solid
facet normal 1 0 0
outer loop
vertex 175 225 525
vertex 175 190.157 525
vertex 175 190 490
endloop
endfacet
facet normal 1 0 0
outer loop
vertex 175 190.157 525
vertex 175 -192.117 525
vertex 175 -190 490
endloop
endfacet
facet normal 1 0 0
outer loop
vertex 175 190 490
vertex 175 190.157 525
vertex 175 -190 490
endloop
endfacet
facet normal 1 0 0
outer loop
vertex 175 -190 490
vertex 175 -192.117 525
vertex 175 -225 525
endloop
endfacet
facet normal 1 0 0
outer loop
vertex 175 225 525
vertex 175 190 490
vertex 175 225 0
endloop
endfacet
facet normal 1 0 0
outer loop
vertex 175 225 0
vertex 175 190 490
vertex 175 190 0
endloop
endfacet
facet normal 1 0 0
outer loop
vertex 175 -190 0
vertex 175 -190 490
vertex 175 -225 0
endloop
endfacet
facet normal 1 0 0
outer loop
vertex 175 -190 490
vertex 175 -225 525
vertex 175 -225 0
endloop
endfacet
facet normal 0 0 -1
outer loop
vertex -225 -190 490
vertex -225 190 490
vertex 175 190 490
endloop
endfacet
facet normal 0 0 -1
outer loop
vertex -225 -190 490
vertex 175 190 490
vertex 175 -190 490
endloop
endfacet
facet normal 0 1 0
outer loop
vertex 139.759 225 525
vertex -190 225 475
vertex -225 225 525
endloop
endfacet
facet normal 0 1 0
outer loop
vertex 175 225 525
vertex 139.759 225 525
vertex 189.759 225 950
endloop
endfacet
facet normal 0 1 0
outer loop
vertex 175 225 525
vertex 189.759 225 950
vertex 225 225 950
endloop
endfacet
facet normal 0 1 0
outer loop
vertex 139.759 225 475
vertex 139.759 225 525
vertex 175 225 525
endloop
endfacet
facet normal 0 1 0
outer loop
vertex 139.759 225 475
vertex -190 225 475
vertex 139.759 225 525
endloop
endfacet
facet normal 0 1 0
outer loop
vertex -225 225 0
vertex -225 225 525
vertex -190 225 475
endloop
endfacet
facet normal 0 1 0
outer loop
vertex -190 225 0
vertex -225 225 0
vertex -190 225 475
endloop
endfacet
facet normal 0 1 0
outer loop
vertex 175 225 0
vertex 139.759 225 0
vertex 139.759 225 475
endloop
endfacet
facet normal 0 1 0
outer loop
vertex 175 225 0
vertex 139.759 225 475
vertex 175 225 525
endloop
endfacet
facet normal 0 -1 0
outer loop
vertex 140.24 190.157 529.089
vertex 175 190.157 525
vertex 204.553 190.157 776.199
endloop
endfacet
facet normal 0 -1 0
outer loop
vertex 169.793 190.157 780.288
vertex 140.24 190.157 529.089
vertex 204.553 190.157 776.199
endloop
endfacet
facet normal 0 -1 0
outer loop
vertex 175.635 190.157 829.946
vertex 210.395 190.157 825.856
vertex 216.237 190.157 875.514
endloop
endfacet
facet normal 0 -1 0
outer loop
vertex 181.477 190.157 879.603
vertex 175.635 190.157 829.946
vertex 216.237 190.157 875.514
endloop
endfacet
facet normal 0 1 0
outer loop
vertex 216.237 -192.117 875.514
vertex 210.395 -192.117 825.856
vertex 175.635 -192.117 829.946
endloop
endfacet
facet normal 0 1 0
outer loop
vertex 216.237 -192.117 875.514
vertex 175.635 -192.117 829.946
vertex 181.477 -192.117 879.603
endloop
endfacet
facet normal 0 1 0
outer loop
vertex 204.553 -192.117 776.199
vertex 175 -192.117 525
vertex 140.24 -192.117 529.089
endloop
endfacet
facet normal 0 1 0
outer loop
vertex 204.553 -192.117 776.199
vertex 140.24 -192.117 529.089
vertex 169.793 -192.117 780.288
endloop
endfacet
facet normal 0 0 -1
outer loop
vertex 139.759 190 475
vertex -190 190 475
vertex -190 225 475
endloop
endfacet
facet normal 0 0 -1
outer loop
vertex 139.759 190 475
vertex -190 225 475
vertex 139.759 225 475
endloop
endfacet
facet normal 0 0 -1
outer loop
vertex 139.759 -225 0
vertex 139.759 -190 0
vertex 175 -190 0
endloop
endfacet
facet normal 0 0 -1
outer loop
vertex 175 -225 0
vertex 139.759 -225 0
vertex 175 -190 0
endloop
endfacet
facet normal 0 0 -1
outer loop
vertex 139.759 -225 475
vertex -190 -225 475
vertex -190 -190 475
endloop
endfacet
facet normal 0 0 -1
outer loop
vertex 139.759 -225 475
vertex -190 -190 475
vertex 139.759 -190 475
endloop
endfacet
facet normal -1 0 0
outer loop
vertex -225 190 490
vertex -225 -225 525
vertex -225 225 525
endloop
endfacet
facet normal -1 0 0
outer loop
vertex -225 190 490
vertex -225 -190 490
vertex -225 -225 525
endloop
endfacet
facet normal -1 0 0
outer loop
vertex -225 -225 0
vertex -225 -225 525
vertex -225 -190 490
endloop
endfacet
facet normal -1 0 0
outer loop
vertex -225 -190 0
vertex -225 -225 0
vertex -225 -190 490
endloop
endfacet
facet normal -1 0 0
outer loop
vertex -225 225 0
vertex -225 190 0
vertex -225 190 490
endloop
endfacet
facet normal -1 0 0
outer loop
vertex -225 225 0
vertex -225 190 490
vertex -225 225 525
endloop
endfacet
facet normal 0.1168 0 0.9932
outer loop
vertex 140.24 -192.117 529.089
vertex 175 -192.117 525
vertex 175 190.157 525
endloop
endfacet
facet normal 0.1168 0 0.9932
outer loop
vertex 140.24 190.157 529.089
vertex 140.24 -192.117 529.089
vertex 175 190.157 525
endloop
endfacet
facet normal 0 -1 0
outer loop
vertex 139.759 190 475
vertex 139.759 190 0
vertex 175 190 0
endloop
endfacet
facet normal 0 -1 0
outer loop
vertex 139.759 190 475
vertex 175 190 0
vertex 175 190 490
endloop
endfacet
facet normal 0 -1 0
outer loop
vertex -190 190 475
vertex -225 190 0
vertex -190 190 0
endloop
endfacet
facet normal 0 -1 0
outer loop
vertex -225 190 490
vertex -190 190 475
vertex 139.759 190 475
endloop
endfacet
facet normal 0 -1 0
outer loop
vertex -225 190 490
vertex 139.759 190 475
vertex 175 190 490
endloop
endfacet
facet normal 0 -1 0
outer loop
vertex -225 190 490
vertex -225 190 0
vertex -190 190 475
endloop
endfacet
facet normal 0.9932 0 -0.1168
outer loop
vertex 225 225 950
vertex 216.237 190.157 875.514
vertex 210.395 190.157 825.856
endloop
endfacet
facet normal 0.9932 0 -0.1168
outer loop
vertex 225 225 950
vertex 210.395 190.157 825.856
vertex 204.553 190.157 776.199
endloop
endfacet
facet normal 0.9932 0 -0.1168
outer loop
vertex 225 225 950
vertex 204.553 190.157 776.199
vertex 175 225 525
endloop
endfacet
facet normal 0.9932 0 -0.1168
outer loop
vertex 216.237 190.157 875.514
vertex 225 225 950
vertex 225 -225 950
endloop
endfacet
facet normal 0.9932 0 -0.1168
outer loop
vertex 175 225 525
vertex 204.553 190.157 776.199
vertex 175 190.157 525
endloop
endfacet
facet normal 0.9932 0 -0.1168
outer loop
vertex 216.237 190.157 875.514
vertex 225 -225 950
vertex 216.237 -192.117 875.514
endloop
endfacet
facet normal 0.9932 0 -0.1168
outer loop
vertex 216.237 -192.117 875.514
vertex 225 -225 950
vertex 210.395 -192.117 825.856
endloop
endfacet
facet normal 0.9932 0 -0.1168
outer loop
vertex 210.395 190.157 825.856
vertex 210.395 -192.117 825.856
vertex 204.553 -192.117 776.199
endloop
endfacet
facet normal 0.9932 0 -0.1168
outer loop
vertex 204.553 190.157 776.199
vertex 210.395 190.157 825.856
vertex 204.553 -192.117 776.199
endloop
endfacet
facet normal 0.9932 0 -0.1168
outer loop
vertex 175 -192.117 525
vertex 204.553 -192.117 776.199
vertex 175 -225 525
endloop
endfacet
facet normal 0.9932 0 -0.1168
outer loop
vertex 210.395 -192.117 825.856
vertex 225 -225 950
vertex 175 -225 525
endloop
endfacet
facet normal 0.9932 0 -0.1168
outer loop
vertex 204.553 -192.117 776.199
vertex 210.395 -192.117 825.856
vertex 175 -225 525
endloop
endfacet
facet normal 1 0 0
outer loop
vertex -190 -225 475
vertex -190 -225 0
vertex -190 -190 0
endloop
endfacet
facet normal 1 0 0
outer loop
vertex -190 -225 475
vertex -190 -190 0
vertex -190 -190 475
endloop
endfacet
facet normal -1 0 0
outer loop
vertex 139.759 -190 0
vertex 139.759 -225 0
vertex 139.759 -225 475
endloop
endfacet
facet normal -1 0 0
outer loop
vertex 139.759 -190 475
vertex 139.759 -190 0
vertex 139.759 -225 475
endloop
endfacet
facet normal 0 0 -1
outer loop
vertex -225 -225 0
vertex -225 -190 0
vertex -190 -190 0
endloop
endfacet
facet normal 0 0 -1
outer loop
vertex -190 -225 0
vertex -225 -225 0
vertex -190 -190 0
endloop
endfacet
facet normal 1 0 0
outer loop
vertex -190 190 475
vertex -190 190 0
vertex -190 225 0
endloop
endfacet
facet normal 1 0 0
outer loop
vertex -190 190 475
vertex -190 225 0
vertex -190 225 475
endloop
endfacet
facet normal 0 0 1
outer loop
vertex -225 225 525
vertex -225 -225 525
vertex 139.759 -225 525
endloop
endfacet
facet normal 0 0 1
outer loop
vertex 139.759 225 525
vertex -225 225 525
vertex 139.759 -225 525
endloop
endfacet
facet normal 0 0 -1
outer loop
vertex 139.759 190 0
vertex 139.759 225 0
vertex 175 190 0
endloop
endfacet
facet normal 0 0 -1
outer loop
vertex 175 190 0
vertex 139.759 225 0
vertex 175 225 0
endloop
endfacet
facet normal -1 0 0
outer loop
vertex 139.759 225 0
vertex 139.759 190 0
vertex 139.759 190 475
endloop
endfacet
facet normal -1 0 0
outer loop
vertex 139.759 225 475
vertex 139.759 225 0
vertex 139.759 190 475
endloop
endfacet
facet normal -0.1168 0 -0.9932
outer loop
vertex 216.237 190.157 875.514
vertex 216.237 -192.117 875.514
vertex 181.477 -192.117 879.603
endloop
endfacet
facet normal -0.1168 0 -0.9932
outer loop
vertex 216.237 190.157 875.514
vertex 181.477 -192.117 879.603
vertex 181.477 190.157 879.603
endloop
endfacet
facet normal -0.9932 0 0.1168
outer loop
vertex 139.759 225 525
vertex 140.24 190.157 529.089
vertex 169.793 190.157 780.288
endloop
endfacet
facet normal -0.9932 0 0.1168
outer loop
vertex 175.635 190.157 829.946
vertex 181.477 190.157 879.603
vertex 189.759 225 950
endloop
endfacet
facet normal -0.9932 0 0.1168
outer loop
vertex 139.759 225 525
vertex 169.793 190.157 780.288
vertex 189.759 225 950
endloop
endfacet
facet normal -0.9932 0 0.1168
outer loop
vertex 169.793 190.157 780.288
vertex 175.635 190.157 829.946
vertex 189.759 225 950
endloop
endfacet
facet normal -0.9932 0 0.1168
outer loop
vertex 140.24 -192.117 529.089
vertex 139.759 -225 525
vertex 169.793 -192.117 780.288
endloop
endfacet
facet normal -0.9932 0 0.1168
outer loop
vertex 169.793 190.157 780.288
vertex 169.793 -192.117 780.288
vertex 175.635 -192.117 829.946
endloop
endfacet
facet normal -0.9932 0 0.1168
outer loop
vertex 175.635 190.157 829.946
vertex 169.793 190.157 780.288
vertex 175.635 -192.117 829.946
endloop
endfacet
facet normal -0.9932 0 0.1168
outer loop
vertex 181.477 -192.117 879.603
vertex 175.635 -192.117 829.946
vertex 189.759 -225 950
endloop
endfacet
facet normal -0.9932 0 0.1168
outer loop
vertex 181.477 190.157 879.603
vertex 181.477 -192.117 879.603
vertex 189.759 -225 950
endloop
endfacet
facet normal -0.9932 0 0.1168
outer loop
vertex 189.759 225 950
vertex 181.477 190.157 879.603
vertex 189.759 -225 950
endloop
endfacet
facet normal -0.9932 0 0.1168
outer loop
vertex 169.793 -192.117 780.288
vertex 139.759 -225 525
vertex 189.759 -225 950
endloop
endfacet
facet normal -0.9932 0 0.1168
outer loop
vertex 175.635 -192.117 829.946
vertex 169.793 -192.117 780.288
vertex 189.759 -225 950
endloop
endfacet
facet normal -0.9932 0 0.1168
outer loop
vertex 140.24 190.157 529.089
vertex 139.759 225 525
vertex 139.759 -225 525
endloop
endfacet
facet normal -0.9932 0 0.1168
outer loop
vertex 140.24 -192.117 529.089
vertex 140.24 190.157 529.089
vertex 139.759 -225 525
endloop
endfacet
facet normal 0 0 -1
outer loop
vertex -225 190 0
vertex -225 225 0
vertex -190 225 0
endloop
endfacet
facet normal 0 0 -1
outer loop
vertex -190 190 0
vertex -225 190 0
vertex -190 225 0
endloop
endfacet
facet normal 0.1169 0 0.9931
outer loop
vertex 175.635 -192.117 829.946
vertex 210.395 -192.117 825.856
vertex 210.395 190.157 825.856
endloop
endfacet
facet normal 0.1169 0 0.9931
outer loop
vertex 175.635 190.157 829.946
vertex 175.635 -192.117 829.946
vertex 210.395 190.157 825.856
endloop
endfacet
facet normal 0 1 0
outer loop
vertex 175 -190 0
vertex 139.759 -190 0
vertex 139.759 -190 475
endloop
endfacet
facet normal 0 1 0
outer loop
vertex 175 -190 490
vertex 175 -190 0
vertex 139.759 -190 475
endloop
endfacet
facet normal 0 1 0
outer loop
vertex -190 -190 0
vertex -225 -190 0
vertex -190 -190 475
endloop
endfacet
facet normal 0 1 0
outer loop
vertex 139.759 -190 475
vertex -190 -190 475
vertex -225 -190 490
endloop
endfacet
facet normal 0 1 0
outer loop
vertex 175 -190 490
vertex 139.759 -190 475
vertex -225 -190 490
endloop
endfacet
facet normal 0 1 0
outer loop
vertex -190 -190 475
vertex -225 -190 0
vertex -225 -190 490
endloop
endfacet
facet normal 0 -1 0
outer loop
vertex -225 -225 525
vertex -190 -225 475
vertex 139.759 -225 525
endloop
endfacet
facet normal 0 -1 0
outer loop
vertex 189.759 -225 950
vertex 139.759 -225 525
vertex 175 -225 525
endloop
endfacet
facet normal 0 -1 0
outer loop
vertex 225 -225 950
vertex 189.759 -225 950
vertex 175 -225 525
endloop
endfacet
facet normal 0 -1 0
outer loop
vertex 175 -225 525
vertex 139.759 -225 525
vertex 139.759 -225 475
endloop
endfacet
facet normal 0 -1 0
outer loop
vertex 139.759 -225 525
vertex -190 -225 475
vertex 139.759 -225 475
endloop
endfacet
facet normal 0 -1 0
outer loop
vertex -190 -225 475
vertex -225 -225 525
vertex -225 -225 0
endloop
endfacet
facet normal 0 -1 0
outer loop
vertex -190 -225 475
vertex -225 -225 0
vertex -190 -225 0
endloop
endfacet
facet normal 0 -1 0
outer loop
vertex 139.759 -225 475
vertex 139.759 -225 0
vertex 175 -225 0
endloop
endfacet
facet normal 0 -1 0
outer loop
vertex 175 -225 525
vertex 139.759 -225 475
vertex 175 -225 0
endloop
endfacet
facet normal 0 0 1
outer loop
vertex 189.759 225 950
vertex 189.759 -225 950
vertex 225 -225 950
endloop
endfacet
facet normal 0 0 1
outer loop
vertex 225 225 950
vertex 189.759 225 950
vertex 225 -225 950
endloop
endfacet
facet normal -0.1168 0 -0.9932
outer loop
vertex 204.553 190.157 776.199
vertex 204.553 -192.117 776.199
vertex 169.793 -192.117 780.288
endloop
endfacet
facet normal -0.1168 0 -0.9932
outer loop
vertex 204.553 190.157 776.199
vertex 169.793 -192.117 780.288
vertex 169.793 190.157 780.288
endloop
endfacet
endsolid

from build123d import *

# Parameters (mm, degrees)
F0_W     = 450
F0_H     = 450
F1_DEPTH = 950
F2_W     = 329.7586178293
F2_H     = 475
F2_W_2   = 50
F2_H_2   = 50
F3_DEPTH = 450.001
F4_W     = 380
F4_H     = 490
F5_DEPTH = 450.001
F6_W     = 382.2745978832
F6_H     = 50
F6_H_2   = 252.9310692156
F7_DEPTH = 446.9187719453


with BuildPart() as f1:
    # F0 (on Top) → F1 (new body)
    with BuildSketch(Plane.XY):
        Rectangle(F0_W, F0_H)
    extrude(amount=F1_DEPTH)

    # F2 (on face) → F3 (cut, through all)
    with BuildSketch(Plane.XZ.offset(225)):
        Polygon((-225, 950), (-225, 525), (139.7586178293, 525), (189.7586178293, 950), align=None)
        with Locations((-25.1206910853, 237.5)):
            Rectangle(F2_W, F2_H)
        Polygon((225, 950), (175, 525), (225, 525), align=None)
        with Locations((200, 500)):
            Rectangle(F2_W_2, F2_H_2)
        with Locations((200, 237.5)):
            Rectangle(F2_W_2, F2_H)
    extrude(amount=-F3_DEPTH, mode=Mode.SUBTRACT)

    # F4 (on face) → F5 (cut, through all)
    with BuildSketch(Plane(origin=(-225, 0, 0), x_dir=(0, -1, 0), z_dir=(-1, 0, 0))):
        with Locations((0, 245)):
            Rectangle(F4_W, F4_H)
    extrude(amount=-F5_DEPTH, mode=Mode.SUBTRACT)

    # F6 (on face) → F7 (cut, through all)
    with BuildSketch(Plane(origin=(111.6894197952, 0, -13.1399317406), x_dir=(0, 1, 0), z_dir=(0.9931506043, 0, -0.1168412476))):
        with Locations((-0.9801834822, 869.7823548094)):
            Rectangle(F6_W, F6_H)
        with Locations((-0.9801834822, 668.3168202016)):
            Rectangle(F6_W, F6_H_2)
    extrude(amount=-F7_DEPTH, mode=Mode.SUBTRACT)


solid = f1.part
